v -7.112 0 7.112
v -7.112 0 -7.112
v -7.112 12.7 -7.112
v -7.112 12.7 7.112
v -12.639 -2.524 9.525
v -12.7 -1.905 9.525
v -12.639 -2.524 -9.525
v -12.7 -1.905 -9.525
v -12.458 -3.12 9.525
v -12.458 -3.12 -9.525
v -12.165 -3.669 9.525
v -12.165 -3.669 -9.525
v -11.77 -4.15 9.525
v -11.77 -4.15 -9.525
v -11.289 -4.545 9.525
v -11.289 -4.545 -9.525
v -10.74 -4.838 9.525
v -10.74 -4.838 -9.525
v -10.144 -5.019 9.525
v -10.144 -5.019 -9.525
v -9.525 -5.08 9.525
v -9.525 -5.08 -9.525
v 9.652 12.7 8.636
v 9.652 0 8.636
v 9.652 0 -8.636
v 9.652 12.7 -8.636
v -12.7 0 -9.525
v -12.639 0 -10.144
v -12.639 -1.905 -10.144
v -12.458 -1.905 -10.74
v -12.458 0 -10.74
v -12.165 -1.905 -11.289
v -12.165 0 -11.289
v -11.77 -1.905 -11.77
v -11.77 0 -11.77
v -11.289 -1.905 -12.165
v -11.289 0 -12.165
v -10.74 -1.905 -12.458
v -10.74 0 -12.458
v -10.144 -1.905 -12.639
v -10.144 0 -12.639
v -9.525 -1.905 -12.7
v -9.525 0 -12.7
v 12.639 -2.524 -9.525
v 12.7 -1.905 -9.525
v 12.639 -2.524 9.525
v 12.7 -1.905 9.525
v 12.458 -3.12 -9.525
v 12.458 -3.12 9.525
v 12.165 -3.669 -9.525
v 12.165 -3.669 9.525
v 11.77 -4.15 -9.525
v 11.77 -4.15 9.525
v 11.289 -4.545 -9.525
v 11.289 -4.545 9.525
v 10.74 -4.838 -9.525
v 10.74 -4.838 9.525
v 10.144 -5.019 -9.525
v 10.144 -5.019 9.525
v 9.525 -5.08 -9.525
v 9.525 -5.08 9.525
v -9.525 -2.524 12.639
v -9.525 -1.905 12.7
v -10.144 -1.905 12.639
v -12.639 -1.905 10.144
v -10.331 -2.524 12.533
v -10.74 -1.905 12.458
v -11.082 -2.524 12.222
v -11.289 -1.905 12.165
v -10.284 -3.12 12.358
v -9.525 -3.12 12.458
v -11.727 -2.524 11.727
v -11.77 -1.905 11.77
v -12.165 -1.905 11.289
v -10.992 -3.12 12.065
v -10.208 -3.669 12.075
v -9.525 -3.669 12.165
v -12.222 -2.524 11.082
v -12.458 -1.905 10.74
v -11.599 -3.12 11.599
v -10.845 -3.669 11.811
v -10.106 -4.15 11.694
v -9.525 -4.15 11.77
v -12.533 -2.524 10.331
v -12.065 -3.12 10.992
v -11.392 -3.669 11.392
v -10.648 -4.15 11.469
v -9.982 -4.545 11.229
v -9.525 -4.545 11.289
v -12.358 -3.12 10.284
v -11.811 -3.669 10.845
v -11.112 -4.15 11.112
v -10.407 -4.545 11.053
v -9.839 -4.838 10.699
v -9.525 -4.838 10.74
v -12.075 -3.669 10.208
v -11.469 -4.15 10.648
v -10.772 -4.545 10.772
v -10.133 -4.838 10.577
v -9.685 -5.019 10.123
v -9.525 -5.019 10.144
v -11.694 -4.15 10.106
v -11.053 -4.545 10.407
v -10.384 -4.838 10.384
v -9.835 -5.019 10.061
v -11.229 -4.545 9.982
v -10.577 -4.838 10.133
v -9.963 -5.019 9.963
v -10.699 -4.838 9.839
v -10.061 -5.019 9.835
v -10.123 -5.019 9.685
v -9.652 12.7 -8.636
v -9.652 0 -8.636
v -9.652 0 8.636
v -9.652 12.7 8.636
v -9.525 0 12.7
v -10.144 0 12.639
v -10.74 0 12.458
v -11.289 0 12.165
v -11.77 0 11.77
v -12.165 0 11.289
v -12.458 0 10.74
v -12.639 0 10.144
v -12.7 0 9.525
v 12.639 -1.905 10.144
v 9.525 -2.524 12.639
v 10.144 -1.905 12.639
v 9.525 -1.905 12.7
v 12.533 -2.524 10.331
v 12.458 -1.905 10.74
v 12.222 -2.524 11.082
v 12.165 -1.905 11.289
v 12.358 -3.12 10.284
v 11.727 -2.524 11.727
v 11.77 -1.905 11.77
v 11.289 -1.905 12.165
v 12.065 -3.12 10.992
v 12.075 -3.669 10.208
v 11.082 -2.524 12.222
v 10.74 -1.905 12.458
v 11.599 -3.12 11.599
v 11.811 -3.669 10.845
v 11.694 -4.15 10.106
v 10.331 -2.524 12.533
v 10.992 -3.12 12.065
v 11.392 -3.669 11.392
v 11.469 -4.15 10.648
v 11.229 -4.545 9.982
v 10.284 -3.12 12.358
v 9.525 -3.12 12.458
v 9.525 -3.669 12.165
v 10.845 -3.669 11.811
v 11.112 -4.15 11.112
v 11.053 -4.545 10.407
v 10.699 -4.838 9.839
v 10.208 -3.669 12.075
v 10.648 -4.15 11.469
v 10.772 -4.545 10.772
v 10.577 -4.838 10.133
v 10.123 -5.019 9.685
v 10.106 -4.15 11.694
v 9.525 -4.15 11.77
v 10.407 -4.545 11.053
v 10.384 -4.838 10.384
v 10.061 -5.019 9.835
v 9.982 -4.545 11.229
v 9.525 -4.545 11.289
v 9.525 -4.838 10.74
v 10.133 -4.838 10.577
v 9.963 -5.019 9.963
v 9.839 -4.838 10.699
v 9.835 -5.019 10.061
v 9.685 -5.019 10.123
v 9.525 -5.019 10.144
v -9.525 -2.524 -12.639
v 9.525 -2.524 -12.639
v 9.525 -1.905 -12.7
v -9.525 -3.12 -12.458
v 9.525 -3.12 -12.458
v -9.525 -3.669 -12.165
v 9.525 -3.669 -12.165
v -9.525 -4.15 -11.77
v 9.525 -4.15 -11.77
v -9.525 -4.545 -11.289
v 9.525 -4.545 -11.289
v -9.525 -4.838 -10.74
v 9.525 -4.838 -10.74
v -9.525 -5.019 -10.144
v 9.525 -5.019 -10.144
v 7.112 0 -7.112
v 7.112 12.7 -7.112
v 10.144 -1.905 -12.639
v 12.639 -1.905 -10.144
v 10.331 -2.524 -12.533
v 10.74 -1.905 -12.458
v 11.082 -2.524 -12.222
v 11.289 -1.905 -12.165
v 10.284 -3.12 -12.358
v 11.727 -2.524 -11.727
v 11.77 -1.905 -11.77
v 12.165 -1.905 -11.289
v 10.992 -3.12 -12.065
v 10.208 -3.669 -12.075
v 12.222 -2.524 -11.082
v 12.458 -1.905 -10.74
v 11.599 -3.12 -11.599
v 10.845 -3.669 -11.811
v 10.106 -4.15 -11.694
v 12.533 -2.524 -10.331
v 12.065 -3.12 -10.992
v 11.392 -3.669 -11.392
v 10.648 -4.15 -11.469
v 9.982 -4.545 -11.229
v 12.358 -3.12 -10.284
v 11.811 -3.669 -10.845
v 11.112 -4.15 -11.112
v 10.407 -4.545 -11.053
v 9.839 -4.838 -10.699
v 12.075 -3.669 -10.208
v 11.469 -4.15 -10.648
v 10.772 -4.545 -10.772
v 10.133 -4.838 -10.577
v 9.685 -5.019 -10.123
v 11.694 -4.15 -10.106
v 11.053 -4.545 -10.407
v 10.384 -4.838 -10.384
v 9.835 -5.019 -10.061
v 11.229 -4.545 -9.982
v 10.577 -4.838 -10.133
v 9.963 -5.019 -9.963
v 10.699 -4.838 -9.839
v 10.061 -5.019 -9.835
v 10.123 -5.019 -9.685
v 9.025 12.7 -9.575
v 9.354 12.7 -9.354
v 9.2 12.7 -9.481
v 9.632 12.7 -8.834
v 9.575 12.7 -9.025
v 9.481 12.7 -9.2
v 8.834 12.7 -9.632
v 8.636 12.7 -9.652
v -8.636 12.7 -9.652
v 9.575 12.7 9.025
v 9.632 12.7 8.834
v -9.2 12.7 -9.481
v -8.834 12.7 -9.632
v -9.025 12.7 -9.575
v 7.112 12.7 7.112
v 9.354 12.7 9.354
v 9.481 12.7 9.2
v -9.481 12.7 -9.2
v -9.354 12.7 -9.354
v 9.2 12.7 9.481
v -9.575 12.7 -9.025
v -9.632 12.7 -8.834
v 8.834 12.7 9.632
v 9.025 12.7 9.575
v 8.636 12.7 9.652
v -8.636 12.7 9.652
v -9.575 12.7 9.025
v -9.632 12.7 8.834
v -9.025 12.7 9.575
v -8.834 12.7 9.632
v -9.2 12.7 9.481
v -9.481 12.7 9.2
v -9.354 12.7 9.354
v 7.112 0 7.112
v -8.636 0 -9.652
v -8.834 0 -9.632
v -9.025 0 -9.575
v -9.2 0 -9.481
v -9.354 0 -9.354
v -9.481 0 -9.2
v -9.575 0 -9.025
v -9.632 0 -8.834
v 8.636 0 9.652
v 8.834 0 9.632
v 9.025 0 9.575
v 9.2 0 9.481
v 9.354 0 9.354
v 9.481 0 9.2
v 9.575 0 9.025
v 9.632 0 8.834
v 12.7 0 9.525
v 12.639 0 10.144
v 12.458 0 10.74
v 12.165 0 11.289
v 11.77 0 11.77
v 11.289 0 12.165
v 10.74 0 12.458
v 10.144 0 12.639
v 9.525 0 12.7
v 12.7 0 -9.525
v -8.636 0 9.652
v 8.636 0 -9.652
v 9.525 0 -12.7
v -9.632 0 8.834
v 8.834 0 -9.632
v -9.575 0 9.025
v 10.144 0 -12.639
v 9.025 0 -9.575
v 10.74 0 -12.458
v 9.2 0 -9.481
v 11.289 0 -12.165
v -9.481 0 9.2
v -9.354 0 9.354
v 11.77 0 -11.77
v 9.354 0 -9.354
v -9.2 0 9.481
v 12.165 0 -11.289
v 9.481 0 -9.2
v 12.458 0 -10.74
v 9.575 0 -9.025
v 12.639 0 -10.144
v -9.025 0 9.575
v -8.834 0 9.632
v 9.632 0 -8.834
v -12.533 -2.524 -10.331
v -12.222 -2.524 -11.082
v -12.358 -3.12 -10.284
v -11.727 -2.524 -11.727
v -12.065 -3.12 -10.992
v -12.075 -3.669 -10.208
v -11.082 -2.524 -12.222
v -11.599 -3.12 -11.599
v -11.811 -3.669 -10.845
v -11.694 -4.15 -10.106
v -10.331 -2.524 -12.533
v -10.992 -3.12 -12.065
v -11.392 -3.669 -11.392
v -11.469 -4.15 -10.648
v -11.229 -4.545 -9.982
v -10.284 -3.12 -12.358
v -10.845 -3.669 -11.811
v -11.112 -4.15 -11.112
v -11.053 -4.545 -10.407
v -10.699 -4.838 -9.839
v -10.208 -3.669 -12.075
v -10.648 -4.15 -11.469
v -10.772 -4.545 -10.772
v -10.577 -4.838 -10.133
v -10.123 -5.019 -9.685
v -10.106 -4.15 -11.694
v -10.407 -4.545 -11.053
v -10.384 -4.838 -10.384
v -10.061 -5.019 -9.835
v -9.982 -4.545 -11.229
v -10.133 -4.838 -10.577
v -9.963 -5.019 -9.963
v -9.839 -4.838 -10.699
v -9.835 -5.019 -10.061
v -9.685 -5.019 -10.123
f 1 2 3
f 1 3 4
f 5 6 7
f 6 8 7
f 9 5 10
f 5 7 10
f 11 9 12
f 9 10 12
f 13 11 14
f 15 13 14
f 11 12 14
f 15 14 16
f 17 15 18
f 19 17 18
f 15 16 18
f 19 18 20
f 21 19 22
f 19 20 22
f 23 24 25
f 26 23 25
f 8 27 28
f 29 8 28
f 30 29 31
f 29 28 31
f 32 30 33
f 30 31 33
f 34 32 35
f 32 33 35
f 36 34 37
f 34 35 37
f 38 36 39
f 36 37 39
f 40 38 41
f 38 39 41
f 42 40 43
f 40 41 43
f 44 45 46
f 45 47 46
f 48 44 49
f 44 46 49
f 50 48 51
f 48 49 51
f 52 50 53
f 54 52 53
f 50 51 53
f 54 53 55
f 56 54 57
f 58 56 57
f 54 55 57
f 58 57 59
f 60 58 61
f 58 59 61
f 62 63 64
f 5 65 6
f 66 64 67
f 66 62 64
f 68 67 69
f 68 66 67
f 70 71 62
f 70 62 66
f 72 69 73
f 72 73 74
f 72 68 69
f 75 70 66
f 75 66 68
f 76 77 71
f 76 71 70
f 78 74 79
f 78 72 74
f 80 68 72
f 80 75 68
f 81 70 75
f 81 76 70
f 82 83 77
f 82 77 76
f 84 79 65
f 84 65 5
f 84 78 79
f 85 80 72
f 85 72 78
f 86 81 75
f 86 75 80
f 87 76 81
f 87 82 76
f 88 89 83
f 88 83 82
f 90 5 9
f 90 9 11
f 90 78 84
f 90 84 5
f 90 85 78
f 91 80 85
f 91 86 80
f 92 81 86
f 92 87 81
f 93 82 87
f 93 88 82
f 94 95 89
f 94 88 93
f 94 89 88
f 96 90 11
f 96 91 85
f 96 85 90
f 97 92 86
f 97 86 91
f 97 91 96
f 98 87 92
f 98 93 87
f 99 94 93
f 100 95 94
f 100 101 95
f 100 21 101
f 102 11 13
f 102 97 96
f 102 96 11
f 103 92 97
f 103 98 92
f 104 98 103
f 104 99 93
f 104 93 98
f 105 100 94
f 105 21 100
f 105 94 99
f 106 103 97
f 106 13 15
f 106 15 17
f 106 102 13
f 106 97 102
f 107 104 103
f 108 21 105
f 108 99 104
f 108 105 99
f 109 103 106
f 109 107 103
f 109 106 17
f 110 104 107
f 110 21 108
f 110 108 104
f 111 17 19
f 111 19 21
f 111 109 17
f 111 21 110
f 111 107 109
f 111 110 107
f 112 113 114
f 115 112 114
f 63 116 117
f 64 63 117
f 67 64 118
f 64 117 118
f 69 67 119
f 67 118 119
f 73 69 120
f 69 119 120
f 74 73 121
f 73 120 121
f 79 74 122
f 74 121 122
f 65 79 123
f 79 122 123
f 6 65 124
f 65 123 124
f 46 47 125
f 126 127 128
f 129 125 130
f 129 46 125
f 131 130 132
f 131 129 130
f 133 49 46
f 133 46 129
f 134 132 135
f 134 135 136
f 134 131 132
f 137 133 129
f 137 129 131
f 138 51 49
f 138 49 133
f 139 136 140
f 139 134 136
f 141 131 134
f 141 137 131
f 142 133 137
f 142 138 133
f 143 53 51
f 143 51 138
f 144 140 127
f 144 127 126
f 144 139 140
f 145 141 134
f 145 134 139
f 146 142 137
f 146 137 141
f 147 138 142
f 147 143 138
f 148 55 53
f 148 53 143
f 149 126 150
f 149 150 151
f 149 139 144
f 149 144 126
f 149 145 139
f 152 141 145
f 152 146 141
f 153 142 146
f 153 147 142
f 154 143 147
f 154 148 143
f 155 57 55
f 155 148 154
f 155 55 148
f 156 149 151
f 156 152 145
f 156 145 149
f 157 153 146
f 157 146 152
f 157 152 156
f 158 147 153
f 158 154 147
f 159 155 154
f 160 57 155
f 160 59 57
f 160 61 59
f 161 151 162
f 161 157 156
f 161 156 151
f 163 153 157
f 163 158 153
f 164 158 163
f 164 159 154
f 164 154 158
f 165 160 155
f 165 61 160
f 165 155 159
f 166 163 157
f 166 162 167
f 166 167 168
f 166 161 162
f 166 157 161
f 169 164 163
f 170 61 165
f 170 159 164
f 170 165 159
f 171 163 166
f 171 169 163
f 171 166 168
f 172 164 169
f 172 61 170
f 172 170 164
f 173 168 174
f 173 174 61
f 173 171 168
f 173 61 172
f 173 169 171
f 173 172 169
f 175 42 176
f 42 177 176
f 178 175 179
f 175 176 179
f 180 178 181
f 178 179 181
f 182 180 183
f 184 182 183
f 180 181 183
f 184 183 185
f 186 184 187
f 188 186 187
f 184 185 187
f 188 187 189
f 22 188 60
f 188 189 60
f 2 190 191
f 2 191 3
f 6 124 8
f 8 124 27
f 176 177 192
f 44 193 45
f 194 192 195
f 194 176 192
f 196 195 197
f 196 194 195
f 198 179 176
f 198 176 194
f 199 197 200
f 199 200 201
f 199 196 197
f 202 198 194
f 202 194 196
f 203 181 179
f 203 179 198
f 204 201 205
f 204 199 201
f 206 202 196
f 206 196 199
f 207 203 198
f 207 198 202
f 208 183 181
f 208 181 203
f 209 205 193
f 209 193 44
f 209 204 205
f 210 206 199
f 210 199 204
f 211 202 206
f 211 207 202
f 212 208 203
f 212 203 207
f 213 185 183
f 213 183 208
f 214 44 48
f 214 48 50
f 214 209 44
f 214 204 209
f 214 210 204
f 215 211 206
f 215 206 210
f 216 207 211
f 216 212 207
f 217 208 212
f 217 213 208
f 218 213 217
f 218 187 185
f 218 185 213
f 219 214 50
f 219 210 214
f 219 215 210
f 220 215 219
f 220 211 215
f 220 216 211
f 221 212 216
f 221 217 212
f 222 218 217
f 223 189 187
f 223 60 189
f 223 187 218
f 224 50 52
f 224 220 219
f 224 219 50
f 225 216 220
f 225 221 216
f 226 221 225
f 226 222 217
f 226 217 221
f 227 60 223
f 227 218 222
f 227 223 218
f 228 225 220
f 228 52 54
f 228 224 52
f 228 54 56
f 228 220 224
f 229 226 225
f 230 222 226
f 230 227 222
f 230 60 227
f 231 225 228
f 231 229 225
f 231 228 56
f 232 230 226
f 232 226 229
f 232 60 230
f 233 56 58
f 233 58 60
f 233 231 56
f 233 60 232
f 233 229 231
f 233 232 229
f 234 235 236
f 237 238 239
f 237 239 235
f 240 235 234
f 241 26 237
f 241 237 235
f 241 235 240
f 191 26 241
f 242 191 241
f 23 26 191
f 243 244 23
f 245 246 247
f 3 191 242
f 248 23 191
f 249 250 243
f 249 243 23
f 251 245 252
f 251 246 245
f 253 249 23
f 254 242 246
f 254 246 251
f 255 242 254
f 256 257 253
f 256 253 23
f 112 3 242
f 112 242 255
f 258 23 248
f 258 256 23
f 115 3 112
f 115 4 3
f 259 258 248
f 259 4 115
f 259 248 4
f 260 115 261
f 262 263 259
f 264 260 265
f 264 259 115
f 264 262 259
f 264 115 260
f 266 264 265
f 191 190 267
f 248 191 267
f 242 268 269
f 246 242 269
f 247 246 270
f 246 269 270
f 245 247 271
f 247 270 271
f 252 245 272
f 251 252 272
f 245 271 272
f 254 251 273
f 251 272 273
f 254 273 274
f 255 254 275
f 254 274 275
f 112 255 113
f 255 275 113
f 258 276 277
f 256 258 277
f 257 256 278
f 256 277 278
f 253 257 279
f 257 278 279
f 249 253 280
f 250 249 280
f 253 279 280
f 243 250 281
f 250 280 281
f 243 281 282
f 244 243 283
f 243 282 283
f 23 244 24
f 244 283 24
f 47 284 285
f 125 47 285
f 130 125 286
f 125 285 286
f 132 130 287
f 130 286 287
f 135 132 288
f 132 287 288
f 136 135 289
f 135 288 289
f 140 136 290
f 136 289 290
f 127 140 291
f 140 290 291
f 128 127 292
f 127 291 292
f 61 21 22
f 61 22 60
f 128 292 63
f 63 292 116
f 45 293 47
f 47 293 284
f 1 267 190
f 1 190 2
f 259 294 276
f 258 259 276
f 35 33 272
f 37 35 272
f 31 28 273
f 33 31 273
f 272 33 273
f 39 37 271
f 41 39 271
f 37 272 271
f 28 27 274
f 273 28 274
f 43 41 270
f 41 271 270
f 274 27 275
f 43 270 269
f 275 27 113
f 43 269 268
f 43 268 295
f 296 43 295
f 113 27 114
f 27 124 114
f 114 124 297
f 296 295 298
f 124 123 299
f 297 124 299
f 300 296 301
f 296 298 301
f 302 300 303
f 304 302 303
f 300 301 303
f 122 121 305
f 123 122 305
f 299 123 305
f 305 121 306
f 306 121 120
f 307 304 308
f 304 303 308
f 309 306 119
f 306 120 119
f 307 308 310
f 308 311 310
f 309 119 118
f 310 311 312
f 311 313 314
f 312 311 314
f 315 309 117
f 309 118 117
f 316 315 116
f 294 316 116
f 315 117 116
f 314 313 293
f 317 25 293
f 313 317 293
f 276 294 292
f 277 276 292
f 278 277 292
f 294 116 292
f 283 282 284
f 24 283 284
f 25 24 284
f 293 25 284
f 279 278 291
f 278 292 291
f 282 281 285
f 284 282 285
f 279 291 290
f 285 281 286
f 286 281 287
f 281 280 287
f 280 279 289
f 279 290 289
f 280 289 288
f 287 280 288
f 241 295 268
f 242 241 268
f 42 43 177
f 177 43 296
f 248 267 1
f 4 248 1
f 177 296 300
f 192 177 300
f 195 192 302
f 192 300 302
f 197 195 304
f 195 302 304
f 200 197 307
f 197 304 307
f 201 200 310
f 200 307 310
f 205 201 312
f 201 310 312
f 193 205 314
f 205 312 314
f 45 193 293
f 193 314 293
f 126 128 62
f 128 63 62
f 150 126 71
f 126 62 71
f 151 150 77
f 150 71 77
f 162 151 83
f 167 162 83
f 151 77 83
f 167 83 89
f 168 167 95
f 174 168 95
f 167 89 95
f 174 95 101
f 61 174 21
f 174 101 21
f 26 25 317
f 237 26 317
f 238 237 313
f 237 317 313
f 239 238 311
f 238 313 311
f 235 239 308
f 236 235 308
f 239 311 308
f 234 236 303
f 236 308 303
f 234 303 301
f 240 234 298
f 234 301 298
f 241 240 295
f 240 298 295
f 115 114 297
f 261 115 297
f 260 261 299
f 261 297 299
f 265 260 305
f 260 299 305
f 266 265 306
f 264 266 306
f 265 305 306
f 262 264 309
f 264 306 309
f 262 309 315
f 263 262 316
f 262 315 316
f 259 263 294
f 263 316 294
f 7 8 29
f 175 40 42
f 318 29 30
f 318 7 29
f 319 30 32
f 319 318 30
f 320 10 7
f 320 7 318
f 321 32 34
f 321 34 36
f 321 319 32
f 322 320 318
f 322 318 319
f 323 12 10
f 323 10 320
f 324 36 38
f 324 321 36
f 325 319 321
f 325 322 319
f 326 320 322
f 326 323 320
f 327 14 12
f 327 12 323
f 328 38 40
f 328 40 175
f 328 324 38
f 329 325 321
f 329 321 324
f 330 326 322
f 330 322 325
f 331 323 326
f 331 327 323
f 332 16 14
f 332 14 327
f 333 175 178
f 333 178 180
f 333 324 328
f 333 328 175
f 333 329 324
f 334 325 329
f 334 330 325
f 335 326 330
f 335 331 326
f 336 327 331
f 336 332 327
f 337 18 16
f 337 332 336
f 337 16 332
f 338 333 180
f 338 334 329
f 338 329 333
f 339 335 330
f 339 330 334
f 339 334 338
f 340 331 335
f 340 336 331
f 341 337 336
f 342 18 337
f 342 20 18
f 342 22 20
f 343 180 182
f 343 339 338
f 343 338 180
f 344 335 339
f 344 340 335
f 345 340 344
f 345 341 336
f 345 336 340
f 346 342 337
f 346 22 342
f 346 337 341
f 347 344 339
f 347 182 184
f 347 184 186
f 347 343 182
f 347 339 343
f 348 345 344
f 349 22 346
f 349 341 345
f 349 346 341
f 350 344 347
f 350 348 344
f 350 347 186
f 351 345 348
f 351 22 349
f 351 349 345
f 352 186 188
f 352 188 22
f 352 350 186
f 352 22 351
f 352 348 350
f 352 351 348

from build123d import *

# Parameters (mm, degrees)
F1_DEPTH = 5.08
F2_R     = 3.175
F4_DEPTH = 12.7
F5_W     = 14.224
F5_H     = 14.224
F6_DEPTH = 43.7134


with BuildPart() as f1:
    # F0 (on Front) → F1 (new body)
    with BuildSketch(Plane.XZ):
        with BuildLine():
            Line((9.525, 12.7), (-9.525, 12.7))
            ThreePointArc((-9.525, 12.7), (-11.770064, 11.770064), (-12.7, 9.525))
            Line((-12.7, 9.525), (-12.7, -9.525))
            ThreePointArc((-12.7, -9.525), (-11.770064, -11.770064), (-9.525, -12.7))
            Line((-9.525, -12.7), (9.525, -12.7))
            ThreePointArc((9.525, -12.7), (11.770064, -11.770064), (12.7, -9.525))
            Line((12.7, -9.525), (12.7, 9.525))
            ThreePointArc((12.7, 9.525), (11.770064, 11.770064), (9.525, 12.7))
        make_face()
    extrude(amount=F1_DEPTH)

    # F2
    f2_edges = [f1.edges().sort_by_distance(p)[0] for p in [
        (12.7, -5.08, 0),
    ]]
    fillet(f2_edges, radius=F2_R)

    # F3 (on face) → F4 (join)
    with BuildSketch(Plane(origin=(0, 0, 0), x_dir=(-1, 0, 0), z_dir=(0, 1, 0))):
        with BuildLine():
            ThreePointArc((9.652, 8.636), (9.35442, 9.35442), (8.636, 9.652))
            Line((8.636, 9.652), (-8.636, 9.652))
            ThreePointArc((-8.636, 9.652), (-9.35442, 9.35442), (-9.652, 8.636))
            Line((-9.652, 8.636), (-9.652, -8.636))
            ThreePointArc((-9.652, -8.636), (-9.35442, -9.35442), (-8.636, -9.652))
            Line((-8.636, -9.652), (8.636, -9.652))
            ThreePointArc((8.636, -9.652), (9.35442, -9.35442), (9.652, -8.636))
            Line((9.652, -8.636), (9.652, 8.636))
        make_face()
    extrude(amount=F4_DEPTH)

    # F5 (on face) → F6 (cut)
    with BuildSketch(Plane(origin=(0, 0, 0), x_dir=(-1, 0, 0), z_dir=(0, 1, 0))):
        Rectangle(F5_W, F5_H)
    extrude(amount=F6_DEPTH, mode=Mode.SUBTRACT)


solid = f1.part
